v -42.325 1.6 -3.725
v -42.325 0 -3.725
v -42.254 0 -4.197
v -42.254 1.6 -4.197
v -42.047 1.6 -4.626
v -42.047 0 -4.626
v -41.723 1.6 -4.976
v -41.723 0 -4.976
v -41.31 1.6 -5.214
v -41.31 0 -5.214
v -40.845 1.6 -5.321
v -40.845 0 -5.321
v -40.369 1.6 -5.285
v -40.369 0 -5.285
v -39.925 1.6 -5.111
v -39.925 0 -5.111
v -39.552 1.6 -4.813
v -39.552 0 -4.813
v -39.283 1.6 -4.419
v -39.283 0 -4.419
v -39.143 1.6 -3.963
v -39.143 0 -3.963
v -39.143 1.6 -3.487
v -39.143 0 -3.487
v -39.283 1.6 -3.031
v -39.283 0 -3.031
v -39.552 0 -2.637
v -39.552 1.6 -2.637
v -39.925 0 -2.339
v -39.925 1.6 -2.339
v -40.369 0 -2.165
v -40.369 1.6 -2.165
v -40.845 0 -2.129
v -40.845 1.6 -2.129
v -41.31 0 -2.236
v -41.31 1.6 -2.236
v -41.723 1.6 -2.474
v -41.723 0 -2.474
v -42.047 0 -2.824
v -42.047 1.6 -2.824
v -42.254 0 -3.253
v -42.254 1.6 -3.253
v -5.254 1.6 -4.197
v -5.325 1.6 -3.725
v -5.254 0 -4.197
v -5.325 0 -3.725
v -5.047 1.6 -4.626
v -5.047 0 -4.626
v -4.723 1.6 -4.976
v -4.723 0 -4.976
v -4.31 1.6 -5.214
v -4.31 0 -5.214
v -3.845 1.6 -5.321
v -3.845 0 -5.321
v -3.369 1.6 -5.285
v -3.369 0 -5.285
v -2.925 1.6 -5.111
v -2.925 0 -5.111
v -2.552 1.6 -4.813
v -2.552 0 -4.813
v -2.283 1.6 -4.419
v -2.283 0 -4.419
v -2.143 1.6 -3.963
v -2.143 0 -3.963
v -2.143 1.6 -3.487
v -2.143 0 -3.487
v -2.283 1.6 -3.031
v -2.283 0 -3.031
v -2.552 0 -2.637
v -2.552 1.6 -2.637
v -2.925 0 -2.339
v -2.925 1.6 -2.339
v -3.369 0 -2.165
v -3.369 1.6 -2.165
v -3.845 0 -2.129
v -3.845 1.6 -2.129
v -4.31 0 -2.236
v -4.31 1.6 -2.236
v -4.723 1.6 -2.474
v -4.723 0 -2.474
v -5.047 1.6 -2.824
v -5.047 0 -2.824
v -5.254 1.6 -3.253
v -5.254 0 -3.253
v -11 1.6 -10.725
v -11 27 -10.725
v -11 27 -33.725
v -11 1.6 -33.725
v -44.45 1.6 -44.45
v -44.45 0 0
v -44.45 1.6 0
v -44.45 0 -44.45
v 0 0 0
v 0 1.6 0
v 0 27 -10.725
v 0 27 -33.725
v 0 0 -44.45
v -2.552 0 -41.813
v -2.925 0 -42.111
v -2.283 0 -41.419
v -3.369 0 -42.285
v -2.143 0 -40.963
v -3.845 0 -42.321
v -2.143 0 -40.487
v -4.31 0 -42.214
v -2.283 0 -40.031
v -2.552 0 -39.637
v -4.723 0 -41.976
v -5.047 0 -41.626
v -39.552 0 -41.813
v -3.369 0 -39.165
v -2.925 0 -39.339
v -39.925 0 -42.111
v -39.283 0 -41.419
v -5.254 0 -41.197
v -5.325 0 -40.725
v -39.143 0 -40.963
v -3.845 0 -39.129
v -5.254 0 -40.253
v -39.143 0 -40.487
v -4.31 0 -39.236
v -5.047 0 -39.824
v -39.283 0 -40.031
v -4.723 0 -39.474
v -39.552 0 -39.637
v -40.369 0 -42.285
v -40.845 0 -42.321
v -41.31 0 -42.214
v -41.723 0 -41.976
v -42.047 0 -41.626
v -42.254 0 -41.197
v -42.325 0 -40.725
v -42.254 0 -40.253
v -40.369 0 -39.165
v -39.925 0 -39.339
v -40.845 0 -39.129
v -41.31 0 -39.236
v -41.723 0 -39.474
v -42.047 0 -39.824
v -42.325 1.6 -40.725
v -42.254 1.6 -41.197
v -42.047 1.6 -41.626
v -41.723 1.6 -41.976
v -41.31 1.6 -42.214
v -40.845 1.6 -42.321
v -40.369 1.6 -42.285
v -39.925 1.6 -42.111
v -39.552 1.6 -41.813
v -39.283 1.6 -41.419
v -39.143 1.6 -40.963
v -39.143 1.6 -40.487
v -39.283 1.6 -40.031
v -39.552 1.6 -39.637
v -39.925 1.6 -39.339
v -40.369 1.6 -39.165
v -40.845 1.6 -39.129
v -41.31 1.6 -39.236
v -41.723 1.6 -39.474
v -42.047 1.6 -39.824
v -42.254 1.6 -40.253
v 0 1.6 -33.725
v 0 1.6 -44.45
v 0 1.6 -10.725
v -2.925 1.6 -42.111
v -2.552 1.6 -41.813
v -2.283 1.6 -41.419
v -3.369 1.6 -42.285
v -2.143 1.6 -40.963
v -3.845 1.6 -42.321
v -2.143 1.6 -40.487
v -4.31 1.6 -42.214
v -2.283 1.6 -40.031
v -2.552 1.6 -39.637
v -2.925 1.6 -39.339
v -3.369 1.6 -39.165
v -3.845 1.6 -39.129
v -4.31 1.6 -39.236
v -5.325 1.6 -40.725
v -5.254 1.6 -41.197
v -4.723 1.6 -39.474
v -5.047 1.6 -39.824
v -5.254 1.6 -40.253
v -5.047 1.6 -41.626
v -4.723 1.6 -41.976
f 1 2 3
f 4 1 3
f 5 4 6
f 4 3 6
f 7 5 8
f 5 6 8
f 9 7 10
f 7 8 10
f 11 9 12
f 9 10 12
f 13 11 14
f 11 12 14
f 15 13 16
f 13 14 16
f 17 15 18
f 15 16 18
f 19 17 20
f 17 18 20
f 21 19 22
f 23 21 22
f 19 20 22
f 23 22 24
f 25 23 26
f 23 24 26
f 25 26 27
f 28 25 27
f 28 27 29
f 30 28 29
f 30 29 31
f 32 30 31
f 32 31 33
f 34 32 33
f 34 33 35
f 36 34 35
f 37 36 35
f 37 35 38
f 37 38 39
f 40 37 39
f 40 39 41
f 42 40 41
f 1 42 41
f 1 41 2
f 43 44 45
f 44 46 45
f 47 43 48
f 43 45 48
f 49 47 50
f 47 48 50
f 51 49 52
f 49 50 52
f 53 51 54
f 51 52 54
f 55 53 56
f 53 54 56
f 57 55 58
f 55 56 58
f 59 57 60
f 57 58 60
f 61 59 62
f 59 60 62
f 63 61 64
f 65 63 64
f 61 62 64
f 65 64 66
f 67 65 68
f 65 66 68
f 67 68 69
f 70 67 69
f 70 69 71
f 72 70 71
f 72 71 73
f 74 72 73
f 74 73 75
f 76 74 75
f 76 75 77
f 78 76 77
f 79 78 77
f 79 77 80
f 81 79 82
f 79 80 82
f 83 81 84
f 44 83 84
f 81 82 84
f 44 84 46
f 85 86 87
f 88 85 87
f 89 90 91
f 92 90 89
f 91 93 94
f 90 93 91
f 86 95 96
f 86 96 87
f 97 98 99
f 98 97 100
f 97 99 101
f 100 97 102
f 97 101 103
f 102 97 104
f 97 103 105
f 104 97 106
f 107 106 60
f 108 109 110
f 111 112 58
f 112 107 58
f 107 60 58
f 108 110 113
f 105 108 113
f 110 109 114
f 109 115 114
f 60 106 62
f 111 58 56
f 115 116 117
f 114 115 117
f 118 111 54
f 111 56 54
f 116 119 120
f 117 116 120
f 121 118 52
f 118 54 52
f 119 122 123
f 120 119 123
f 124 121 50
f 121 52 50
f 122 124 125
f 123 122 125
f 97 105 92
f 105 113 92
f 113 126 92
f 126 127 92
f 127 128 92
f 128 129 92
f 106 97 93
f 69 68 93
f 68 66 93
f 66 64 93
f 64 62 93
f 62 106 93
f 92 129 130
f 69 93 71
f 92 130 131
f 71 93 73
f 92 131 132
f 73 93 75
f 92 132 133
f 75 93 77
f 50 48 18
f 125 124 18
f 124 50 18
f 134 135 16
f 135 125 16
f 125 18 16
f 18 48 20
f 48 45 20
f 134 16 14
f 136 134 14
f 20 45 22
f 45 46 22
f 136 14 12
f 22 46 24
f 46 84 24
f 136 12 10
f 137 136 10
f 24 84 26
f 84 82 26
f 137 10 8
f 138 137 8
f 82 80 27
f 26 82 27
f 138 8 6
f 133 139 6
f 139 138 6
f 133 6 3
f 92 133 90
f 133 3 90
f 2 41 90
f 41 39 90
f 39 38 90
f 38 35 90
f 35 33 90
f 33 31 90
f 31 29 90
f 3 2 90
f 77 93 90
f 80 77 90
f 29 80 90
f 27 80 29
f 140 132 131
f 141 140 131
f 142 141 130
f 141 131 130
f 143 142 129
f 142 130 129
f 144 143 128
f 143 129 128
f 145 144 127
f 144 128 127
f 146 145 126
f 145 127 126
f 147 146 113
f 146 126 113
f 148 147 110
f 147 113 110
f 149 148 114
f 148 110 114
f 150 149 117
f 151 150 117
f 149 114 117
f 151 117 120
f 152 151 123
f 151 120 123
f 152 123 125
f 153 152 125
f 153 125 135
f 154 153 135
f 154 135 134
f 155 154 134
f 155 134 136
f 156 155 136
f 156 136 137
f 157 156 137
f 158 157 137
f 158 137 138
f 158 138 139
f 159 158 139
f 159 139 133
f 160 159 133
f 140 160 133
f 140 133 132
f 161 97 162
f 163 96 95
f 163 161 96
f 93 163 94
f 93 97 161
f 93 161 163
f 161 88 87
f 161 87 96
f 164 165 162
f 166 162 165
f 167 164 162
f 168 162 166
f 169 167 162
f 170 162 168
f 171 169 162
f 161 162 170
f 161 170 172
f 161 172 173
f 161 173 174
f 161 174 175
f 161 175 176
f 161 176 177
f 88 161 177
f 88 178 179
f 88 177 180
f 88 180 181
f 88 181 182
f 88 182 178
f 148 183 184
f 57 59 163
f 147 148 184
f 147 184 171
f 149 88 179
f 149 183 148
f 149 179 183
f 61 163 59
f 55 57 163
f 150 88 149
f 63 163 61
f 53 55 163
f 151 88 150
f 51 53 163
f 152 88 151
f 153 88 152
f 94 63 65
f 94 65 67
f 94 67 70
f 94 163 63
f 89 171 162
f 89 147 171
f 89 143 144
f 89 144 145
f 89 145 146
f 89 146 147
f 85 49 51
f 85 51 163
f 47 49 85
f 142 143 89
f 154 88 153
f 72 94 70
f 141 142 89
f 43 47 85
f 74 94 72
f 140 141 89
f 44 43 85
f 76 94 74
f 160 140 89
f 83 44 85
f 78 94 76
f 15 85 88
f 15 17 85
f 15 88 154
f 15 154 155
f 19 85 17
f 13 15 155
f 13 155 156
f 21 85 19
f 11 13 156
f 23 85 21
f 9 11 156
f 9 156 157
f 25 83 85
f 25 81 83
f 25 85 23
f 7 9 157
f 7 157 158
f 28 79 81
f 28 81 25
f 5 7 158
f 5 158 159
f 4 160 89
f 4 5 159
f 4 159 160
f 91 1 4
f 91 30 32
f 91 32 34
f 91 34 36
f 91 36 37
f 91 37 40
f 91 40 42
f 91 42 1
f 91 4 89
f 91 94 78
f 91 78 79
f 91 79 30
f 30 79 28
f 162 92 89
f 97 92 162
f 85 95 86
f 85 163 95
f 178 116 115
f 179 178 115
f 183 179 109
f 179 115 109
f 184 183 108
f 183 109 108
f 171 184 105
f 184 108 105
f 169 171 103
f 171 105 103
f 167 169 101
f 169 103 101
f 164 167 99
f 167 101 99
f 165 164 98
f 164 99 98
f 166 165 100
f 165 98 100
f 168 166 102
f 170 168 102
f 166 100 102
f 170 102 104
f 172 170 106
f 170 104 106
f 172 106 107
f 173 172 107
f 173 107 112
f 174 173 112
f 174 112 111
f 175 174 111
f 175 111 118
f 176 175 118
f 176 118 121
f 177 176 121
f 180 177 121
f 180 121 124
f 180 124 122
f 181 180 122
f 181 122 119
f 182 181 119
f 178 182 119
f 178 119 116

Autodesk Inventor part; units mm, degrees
ref_plane "YZ Plane" through (0, 0, 0) normal (1, 0, 0) x (0, 1, 0)
ref_plane "XZ Plane" through (0, 0, 0) normal (0, 1, 0) x (-1, 0, 0)
ref_plane "XY Plane" through (0, 0, 0) normal (0, 0, 1) x (1, 0, 0)
sketch "草圖1" plane through (0, 0, 0) normal (0, 1, 0) x (-1, 0, 0)
  line L0 (0, 0) -> (44.45, 0)
  line L1 (44.45, 0) -> (44.45, -44.45)
  line L2 (44.45, -44.45) -> (0, -44.45)
  line L3 (0, -44.45) -> (0, 0)
  line L4 (3.725, -3.725) -> (40.725, -3.725)
  line L5 (40.725, -3.725) -> (40.725, -40.725)
  line L6 (40.725, -40.725) -> (3.725, -40.725)
  line L7 (3.725, -40.725) -> (3.725, -3.725)
  circle A0 centre (40.725, -3.725) radius 1.6
  circle A1 centre (40.725, -40.725) radius 1.6
  circle A2 centre (3.725, -3.725) radius 1.6
  circle A3 centre (3.725, -40.725) radius 1.6
  line L8 (11, -33.725) -> (0, -33.725)
  line L9 (0, -33.725) -> (0, -10.725)
  line L10 (0, -10.725) -> (11, -10.725)
  line L11 (11, -10.725) -> (11, -33.725)
  point P0 (0, -33.725)
  dimension "d0" = 44.45
  dimension "d1" = 44.45
  dimension "d2" = 37
  dimension "d3" = 37
  dimension "d4" = 3.725
  dimension "d5" = 3.725
  dimension "d6" = 3.2
  dimension "d7" = 3.2
  dimension "d8" = 3.2
  dimension "d9" = 3.2
  dimension "d14" = 23
  dimension "d15" = 11
  dimension "d16" = 10.725
extrude "擠出1" add sketch "草圖1" along normal blind 27 contours L10 L7 L8 L3 | L10 L11 L8 L7
extrude "擠出2" cut sketch "草圖1" along normal blind 27 contours A2 L4 L7 | L7 L4 A2 | A3 L6 L7 | L7 L6 A3 | A0 L5 L4 | L4 L5 A0 | A1 L5 L6 | L6 L5 A1
extrude "擠出3" add sketch "草圖1" along normal blind 1.6 contours L0 L1 L2 L3 L8 L7 A3 L6 A1 L5 A0 L4 A2 L10 | L7 A2 L4 A0 L5 A1 L6 A3 L8 L11 L10
properties part number "l298n"
